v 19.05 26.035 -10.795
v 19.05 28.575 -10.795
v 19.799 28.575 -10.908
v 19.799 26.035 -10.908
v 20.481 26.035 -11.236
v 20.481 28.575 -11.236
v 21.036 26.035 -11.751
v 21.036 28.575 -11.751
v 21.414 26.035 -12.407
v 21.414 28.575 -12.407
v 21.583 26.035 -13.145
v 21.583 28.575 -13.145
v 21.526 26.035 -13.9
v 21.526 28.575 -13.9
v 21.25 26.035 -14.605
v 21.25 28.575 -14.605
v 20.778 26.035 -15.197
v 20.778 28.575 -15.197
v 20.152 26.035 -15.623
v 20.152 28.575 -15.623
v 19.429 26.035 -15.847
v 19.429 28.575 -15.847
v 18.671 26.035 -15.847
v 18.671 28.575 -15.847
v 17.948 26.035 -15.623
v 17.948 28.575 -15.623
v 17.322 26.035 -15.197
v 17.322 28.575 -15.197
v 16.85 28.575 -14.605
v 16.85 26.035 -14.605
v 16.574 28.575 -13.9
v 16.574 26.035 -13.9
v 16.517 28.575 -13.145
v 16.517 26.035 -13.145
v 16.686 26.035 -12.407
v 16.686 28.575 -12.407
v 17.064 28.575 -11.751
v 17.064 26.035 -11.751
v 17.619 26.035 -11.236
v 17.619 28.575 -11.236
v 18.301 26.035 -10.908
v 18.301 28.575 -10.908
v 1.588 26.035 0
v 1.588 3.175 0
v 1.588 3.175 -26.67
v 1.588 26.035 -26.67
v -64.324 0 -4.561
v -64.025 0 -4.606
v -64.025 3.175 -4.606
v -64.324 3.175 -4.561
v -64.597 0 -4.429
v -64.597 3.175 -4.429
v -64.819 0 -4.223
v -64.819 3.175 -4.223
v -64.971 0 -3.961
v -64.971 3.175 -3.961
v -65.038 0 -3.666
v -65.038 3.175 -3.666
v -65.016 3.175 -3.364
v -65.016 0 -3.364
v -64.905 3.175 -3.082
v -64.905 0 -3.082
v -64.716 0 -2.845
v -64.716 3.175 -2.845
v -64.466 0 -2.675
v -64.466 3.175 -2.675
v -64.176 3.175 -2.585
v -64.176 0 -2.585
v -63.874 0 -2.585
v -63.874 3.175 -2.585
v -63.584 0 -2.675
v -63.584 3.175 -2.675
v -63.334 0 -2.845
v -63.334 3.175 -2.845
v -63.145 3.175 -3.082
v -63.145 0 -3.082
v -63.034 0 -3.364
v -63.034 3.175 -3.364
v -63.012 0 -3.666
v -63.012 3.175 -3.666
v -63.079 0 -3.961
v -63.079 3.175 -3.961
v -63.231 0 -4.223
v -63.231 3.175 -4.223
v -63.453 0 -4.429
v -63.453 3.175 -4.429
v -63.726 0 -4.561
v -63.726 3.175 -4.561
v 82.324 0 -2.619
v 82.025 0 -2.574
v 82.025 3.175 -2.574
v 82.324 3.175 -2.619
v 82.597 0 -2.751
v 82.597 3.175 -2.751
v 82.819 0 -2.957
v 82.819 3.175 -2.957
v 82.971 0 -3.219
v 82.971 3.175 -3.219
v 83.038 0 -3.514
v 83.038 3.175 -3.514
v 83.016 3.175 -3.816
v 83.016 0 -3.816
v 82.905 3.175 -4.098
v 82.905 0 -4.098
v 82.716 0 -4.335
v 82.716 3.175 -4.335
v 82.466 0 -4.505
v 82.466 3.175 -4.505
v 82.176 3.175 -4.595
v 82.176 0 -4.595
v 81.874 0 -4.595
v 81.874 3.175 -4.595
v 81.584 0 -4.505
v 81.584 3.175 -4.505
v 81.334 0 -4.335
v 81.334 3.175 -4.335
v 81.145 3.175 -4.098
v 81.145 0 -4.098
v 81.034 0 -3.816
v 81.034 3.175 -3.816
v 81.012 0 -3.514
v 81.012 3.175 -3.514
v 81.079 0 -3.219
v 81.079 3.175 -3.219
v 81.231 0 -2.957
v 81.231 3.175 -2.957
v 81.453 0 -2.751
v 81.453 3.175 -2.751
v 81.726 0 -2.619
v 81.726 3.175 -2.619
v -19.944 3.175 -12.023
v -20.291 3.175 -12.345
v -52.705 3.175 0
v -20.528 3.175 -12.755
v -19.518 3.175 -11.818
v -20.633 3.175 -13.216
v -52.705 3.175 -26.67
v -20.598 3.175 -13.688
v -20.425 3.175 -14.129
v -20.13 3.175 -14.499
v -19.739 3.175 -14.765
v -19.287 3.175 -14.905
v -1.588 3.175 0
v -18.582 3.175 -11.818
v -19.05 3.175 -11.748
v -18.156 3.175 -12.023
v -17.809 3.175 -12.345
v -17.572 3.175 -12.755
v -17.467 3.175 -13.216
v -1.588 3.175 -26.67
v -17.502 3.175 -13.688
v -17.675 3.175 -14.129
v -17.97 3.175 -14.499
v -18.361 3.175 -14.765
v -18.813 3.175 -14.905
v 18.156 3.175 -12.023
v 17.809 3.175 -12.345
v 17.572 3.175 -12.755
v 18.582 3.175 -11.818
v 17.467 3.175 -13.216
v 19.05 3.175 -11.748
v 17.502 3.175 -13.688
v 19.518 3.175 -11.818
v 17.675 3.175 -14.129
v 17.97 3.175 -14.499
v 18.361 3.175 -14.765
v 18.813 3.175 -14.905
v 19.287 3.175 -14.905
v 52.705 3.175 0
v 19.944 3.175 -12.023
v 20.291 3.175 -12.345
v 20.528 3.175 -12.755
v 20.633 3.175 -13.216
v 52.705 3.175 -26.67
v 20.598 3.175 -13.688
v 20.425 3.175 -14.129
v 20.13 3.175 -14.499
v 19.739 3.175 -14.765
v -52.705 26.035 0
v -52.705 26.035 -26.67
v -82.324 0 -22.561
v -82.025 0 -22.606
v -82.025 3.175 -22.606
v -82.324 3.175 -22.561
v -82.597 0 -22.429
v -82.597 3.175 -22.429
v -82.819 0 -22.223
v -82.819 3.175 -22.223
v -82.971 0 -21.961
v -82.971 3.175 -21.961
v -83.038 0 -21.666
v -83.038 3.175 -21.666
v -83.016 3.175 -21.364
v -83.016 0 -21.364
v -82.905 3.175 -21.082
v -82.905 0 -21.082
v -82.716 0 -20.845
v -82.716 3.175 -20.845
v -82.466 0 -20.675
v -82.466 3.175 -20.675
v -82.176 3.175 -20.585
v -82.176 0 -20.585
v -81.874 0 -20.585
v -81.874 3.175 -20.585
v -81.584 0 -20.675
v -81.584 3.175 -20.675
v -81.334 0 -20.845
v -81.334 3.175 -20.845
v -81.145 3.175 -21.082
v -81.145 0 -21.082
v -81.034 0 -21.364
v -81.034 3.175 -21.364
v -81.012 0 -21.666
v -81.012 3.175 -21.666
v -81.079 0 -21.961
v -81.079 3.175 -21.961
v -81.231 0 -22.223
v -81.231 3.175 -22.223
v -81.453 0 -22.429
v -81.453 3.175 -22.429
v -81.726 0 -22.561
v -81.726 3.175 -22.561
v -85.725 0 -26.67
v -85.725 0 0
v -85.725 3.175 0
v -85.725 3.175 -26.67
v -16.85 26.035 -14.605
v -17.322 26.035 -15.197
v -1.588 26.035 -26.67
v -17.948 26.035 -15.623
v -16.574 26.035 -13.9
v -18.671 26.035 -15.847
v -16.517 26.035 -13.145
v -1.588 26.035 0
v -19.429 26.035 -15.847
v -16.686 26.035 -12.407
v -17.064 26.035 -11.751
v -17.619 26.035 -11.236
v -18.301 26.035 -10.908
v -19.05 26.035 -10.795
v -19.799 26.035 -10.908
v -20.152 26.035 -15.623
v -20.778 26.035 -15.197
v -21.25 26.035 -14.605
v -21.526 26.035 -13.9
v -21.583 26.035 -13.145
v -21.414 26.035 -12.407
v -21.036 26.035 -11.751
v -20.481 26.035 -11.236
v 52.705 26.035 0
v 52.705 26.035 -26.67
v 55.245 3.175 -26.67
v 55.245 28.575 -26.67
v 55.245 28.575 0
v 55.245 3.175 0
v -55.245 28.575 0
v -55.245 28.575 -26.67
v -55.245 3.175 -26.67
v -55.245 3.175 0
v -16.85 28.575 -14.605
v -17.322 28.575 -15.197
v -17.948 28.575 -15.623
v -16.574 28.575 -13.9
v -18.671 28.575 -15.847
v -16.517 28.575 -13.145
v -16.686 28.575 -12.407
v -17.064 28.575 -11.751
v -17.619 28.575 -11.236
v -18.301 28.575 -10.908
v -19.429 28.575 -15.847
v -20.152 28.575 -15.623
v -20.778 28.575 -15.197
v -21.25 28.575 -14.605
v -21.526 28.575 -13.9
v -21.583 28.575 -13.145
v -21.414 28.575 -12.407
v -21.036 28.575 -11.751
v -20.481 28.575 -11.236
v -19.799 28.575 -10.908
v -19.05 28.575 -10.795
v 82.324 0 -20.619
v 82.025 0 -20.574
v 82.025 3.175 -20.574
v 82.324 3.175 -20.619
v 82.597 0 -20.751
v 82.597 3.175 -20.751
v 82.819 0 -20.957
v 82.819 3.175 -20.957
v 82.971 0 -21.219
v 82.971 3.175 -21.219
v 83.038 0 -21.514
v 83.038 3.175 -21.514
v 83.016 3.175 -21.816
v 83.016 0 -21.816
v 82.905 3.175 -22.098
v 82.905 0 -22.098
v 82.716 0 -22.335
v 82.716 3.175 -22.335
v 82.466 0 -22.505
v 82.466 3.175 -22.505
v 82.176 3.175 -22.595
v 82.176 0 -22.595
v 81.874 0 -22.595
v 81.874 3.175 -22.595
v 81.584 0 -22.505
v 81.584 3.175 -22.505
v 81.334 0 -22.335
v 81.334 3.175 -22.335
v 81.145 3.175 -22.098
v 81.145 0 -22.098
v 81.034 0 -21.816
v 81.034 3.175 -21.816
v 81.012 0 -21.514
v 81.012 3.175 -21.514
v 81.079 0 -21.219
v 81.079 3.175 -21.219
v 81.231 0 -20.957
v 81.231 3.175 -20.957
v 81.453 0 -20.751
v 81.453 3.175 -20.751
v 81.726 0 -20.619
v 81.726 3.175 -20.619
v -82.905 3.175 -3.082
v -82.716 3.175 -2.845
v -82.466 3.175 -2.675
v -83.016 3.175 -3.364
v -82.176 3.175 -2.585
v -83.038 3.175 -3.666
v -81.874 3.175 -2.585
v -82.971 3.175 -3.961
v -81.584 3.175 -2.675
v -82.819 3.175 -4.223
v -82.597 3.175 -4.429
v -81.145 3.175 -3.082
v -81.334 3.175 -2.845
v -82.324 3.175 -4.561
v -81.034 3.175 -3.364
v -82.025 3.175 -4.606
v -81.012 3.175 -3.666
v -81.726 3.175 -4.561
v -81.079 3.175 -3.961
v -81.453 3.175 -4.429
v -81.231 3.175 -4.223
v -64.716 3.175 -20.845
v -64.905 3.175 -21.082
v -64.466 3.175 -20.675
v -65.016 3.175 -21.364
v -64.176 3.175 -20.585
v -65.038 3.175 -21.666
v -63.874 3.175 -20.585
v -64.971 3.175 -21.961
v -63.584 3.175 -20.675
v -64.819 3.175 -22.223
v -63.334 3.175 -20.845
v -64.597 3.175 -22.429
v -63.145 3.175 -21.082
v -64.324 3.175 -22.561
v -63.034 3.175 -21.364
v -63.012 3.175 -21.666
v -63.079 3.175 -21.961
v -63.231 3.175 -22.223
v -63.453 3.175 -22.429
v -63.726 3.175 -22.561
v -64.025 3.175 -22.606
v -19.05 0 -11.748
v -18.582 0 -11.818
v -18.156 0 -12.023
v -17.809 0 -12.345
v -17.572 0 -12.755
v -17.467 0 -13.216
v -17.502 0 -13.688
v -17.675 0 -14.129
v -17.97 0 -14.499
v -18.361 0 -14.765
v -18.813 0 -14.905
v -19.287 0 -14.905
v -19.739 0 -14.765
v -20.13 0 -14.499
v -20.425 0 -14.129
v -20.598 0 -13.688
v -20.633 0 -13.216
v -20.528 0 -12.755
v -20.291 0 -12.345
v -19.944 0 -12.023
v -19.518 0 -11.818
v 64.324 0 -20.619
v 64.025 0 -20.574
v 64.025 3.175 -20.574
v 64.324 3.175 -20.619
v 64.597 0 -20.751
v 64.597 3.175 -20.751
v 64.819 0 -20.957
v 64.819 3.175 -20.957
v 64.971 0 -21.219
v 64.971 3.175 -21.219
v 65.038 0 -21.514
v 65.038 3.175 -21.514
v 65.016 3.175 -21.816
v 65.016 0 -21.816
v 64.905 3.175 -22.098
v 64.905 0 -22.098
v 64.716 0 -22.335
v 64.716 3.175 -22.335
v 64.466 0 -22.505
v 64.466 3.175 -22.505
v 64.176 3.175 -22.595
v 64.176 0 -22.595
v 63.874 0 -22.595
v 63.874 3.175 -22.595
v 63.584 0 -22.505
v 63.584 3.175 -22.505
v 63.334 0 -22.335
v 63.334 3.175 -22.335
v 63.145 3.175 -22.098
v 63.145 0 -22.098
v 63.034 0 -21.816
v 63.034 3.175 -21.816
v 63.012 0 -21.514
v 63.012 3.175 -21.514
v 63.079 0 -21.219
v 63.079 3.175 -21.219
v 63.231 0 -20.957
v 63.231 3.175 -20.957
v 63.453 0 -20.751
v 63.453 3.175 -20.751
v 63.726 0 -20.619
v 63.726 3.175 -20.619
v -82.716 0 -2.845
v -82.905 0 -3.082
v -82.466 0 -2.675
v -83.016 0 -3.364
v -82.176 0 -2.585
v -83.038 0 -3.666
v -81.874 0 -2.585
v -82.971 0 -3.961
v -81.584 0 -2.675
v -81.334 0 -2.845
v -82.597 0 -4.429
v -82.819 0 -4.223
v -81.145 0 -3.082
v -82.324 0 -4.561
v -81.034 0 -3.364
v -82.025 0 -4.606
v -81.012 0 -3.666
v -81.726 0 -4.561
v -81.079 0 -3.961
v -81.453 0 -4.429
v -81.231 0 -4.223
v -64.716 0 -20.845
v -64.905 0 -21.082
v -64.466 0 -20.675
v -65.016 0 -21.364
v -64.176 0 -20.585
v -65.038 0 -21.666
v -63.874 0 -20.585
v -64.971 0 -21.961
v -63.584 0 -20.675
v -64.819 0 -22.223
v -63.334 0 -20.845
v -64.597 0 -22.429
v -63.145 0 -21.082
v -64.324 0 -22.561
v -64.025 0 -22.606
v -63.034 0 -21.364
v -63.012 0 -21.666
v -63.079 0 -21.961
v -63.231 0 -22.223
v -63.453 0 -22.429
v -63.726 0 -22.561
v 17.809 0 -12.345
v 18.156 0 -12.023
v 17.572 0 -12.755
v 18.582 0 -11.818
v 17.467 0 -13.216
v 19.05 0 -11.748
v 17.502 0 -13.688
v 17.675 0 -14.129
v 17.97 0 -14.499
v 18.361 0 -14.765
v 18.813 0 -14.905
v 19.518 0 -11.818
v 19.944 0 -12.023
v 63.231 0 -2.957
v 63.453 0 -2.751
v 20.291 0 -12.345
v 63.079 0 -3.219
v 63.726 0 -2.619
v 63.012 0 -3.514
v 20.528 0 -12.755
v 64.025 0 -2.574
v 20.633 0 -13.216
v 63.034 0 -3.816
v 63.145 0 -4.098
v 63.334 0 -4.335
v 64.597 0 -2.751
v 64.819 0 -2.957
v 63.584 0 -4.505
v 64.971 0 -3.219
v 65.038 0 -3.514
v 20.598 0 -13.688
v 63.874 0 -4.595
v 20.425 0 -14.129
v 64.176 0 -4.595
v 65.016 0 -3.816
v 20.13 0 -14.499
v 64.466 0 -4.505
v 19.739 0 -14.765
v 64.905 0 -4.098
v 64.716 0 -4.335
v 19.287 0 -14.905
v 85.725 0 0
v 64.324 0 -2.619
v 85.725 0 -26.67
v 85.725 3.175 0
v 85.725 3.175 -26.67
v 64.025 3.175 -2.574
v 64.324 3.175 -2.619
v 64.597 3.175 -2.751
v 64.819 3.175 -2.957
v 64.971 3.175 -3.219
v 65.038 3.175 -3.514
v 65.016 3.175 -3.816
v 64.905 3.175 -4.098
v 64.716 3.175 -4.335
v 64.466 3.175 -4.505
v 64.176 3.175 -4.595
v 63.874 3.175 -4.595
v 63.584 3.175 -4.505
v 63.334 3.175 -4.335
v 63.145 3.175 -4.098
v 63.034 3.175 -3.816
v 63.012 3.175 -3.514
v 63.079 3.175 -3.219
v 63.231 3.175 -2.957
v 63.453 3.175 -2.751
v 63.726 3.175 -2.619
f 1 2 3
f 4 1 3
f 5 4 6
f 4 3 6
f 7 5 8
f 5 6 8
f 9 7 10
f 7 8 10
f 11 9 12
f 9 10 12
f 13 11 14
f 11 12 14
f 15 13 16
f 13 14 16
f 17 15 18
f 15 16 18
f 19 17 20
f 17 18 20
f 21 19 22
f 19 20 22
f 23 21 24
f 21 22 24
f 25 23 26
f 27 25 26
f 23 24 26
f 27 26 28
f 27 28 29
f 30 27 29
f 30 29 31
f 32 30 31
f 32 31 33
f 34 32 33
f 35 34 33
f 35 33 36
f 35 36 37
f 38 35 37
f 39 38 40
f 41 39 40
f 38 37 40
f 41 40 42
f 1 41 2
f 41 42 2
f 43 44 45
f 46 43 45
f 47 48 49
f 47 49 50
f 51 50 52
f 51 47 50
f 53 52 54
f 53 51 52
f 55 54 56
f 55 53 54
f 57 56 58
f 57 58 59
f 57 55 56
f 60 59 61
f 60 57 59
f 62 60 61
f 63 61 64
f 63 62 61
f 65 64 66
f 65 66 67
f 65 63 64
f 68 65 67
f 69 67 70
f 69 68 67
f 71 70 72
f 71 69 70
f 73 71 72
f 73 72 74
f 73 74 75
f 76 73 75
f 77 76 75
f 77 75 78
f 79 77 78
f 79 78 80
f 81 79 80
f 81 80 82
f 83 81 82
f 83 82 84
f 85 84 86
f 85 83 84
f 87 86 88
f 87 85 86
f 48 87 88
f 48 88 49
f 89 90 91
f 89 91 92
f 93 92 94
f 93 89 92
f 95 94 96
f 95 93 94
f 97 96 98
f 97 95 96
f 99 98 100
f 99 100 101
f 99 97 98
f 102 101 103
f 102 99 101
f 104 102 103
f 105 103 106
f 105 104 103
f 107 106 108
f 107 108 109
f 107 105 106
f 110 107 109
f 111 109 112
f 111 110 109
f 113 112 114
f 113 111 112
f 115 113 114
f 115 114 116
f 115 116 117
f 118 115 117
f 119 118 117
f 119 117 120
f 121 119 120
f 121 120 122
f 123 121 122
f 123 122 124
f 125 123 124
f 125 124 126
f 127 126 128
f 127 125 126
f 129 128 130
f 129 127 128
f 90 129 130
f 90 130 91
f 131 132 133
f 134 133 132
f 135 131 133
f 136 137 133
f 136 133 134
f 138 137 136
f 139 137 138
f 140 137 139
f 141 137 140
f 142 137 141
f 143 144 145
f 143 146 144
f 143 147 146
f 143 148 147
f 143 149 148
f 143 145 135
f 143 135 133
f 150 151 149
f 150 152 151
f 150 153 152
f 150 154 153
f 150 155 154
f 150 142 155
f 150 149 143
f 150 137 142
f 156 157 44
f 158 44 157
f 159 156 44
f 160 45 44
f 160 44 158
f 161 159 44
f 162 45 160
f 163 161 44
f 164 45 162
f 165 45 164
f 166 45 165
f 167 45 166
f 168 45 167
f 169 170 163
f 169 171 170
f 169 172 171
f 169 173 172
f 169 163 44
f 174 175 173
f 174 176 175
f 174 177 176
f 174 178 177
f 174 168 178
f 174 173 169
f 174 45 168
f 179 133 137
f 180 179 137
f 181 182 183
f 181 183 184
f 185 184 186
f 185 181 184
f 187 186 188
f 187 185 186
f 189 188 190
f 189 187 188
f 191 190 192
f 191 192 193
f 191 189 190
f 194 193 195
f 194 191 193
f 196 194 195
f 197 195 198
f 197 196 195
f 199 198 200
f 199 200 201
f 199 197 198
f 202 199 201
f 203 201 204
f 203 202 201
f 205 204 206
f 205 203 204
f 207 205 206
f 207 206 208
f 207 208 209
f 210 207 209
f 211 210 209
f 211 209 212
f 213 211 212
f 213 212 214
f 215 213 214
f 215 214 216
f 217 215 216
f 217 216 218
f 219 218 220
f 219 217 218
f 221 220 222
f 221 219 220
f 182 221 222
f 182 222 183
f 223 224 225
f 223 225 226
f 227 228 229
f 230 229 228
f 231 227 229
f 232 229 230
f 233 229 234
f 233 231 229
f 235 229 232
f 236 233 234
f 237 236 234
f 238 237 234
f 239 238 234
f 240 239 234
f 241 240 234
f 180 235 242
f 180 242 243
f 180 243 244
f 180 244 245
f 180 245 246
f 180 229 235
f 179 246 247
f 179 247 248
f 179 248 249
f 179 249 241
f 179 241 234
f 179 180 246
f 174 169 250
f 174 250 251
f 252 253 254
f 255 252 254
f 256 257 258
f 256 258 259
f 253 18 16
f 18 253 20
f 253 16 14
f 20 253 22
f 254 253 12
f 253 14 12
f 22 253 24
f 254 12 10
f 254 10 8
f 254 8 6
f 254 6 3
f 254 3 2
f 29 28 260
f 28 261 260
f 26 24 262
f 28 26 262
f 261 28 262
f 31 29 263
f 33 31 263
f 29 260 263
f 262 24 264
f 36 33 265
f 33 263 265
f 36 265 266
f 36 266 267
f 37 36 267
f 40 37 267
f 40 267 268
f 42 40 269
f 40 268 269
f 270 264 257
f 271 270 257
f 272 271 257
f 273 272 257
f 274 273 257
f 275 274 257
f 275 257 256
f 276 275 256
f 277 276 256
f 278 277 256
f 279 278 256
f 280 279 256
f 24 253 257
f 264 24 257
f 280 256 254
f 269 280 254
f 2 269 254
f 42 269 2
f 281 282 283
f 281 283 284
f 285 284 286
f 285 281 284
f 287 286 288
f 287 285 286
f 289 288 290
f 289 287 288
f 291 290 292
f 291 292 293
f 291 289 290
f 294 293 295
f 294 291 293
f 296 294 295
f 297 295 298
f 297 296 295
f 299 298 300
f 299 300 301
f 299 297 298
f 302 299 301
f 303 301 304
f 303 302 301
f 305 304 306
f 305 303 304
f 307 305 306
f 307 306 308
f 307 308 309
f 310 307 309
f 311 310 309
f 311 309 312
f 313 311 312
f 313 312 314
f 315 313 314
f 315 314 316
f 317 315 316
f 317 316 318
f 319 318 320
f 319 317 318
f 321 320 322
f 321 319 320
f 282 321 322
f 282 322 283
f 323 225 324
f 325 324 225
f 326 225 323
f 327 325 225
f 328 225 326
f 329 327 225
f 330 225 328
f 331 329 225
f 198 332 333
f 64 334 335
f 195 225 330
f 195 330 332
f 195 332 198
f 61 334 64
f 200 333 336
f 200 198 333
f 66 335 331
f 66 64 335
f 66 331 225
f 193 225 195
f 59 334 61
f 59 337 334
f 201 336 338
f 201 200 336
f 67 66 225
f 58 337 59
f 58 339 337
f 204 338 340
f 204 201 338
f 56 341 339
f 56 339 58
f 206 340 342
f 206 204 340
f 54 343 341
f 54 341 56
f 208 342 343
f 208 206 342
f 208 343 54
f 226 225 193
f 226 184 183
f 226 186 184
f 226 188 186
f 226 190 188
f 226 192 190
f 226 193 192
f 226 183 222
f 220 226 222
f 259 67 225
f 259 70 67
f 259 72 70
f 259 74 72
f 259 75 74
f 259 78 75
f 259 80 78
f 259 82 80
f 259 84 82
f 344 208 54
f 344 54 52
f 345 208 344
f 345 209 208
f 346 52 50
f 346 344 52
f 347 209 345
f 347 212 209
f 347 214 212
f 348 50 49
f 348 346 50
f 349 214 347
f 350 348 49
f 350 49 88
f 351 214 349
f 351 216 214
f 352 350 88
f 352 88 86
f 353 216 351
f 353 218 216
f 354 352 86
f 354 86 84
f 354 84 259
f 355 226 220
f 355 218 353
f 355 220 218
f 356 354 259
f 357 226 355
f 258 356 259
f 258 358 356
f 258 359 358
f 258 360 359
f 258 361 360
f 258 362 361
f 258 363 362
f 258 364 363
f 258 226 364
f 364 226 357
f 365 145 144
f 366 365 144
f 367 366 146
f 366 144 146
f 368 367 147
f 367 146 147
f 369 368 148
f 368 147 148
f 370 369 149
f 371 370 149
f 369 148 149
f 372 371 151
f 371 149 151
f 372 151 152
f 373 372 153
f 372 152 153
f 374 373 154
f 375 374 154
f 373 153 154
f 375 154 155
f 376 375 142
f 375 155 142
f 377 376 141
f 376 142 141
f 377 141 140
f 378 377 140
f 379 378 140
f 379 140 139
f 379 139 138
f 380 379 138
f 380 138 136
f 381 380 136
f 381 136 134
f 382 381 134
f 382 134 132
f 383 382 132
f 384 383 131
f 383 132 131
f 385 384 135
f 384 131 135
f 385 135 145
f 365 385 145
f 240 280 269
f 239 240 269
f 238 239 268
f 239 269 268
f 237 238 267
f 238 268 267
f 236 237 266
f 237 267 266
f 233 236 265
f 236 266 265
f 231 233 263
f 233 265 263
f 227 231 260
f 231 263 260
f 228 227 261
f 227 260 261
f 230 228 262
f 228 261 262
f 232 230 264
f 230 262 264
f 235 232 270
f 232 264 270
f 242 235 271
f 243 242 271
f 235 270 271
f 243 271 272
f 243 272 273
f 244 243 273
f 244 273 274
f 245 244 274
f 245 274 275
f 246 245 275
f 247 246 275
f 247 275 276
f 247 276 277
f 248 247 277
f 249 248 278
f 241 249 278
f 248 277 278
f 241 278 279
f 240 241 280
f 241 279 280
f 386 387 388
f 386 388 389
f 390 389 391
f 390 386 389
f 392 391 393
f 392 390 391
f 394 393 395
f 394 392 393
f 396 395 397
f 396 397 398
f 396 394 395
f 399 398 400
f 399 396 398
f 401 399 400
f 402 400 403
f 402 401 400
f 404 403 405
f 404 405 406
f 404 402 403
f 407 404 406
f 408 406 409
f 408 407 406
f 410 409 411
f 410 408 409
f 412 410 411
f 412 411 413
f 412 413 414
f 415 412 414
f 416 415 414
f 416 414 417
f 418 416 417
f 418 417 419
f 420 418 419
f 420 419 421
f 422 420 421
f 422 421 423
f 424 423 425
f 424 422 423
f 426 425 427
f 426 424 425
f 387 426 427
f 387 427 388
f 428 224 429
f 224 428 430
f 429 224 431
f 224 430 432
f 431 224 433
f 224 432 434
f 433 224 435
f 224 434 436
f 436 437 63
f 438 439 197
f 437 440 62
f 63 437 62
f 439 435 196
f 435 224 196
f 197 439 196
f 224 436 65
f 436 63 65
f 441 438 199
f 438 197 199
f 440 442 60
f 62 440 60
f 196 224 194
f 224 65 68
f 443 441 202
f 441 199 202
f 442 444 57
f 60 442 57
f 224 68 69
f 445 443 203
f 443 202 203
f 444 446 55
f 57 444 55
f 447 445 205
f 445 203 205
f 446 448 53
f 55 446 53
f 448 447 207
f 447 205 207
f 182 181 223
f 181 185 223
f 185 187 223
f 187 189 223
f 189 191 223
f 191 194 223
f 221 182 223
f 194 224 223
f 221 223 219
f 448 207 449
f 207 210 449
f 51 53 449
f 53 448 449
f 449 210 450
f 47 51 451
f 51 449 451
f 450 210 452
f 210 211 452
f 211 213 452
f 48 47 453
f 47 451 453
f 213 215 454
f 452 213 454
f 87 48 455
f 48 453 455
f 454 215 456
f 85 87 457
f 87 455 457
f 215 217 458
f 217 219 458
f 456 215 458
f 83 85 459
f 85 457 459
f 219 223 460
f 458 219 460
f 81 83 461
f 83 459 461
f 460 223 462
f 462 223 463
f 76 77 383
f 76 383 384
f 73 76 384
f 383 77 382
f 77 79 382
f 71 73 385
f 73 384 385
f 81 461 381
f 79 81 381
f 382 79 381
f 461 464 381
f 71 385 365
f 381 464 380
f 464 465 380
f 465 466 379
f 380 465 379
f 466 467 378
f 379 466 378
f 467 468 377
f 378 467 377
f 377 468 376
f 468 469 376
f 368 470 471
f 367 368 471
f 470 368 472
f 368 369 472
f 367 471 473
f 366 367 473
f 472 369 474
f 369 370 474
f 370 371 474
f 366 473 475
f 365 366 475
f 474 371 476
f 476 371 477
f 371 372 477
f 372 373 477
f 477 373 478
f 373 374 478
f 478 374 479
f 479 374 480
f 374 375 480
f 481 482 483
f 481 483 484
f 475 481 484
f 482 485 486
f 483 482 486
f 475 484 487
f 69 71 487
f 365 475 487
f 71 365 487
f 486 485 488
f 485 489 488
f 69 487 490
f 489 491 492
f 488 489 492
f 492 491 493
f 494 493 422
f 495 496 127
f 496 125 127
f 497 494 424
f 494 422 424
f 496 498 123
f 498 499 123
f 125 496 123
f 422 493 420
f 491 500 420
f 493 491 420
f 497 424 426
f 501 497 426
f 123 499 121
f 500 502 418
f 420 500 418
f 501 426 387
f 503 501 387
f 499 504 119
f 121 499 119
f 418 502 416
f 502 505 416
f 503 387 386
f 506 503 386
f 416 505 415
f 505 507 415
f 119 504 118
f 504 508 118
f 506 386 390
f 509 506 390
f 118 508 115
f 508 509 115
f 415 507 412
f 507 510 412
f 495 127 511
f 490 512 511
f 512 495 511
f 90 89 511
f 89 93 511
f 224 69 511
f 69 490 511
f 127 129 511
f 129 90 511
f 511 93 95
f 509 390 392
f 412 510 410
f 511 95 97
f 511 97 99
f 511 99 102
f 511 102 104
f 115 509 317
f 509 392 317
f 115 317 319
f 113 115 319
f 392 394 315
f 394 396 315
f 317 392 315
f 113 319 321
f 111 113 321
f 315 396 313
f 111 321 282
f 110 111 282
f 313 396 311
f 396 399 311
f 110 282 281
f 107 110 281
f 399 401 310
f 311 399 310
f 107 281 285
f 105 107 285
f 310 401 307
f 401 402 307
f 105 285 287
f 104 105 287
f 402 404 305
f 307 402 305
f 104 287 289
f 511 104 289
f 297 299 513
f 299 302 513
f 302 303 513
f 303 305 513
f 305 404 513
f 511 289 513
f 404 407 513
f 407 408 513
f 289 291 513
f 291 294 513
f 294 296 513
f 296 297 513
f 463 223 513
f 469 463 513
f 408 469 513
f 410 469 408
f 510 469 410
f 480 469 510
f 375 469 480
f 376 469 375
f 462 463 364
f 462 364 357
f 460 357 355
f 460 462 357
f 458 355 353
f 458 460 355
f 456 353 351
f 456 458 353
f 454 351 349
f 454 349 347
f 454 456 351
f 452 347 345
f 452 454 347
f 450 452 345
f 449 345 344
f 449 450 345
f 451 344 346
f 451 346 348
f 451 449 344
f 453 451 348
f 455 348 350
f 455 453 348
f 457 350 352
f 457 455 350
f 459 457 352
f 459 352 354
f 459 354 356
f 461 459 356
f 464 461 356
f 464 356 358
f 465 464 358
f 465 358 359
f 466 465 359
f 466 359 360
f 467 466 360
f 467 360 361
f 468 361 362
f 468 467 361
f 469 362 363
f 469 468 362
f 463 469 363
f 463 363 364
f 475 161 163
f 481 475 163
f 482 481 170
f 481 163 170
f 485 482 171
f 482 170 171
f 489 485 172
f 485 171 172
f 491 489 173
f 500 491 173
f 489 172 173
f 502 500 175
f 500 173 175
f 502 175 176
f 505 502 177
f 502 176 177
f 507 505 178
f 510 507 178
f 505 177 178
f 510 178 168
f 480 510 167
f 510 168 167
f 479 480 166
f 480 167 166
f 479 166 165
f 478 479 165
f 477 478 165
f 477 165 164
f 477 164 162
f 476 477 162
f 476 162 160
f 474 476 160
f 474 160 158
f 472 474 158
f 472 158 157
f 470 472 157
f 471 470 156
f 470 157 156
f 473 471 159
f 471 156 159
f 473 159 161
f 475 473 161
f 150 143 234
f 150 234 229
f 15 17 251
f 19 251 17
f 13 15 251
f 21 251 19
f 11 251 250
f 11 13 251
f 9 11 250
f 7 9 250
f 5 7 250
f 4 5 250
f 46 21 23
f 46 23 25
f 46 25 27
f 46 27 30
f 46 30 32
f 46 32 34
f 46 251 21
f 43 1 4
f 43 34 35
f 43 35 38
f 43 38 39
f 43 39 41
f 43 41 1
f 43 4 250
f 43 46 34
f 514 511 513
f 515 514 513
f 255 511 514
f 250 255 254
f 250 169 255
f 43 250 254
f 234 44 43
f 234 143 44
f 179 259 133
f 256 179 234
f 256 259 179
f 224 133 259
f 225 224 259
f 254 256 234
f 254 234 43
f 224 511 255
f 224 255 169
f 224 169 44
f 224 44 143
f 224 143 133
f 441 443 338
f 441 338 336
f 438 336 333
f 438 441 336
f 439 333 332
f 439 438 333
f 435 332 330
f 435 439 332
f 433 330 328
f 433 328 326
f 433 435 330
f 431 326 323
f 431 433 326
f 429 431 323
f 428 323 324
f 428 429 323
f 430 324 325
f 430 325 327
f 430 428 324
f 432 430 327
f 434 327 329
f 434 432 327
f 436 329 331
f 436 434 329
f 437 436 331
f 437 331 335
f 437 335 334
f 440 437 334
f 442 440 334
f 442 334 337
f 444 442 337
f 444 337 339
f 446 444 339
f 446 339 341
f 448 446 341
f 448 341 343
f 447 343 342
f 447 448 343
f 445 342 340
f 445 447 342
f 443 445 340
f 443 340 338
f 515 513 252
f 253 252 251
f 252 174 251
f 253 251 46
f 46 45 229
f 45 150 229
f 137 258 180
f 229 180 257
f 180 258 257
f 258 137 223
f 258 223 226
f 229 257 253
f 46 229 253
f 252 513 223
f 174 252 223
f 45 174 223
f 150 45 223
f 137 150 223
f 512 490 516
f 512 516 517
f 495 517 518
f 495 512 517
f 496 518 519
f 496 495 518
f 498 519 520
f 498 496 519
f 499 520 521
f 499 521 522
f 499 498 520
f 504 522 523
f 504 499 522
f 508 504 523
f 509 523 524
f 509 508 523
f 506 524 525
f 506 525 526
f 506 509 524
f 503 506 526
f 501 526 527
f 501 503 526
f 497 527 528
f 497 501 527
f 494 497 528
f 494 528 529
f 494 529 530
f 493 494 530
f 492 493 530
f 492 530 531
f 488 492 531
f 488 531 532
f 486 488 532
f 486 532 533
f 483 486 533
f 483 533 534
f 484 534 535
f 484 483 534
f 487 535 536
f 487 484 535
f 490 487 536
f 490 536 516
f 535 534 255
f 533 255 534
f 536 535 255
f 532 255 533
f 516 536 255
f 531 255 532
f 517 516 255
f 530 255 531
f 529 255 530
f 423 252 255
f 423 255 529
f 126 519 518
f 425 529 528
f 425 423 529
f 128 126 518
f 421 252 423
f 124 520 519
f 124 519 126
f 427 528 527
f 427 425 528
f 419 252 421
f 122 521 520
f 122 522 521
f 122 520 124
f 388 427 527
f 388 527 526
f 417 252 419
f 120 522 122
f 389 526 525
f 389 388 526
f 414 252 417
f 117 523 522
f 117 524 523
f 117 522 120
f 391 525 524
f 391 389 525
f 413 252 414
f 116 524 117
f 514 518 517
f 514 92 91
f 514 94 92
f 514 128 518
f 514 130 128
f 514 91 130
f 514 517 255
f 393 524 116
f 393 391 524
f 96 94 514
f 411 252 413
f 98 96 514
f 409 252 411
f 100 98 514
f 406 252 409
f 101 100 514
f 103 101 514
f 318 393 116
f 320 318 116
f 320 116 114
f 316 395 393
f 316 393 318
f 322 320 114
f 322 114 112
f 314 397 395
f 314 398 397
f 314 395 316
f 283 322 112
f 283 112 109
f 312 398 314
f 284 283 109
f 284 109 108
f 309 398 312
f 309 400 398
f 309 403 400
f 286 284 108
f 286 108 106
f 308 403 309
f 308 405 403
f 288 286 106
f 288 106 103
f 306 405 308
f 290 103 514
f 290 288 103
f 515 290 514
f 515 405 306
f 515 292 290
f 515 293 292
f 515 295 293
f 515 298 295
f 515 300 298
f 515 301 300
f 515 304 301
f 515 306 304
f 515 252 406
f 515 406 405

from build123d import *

# Parameters (mm, degrees)
SKETCH1_W           = 171.45
SKETCH1_H           = 26.67
SKETCH1_R           = 1.016
BOSS_EXTRUDE1_DEPTH = 3.175
SKETCH2_W           = 2.54
SKETCH2_H           = 26.67
BOSS_EXTRUDE2_DEPTH = 22.86
SKETCH3_W           = 26.67
SKETCH3_H           = 2.54
BOSS_EXTRUDE3_DEPTH = 110.49
SKETCH4_R           = 1.5875
CUT_EXTRUDE1_DEPTH  = 3.175
SKETCH5_R           = 2.54
CUT_EXTRUDE2_DEPTH  = 2.54
SKETCH6_W           = 3.175
SKETCH6_H           = 26.67
BOSS_EXTRUDE4_DEPTH = 22.86


with BuildPart() as part:
    # Sketch1 → Boss-Extrude1 (new body)
    with BuildSketch(Plane(origin=(0, 0, 0), x_dir=(1, 0, 0), z_dir=(0, 1, 0))):
        with Locations((0, 13.335)):
            Rectangle(SKETCH1_W, SKETCH1_H)
        with Locations(Location((64.025, 21.59, 0), (0, 0, 270))):
            Circle(SKETCH1_R, mode=Mode.SUBTRACT)
        with Locations(Location((82.025, 21.59, 0), (0, 0, 270))):
            Circle(SKETCH1_R, mode=Mode.SUBTRACT)
        with Locations(Location((64.025, 3.59, 0), (0, 0, 270))):
            Circle(SKETCH1_R, mode=Mode.SUBTRACT)
        with Locations(Location((82.025, 3.59, 0), (0, 0, 270))):
            Circle(SKETCH1_R, mode=Mode.SUBTRACT)
        with Locations(Location((-82.025, 3.59, 0), (0, 0, 90))):
            Circle(SKETCH1_R, mode=Mode.SUBTRACT)
        with Locations(Location((-64.025, 3.59, 0), (0, 0, 90))):
            Circle(SKETCH1_R, mode=Mode.SUBTRACT)
        with Locations(Location((-82.025, 21.59, 0), (0, 0, 90))):
            Circle(SKETCH1_R, mode=Mode.SUBTRACT)
        with Locations(Location((-64.025, 21.59, 0), (0, 0, 90))):
            Circle(SKETCH1_R, mode=Mode.SUBTRACT)
    extrude(amount=BOSS_EXTRUDE1_DEPTH)

    # Sketch2 → Boss-Extrude2 (add)
    with BuildSketch(Plane(origin=(0, 3.175, 0), x_dir=(1, 0, 0), z_dir=(0, 1, 0))):
        with Locations((-53.975, 13.335)):
            Rectangle(SKETCH2_W, SKETCH2_H)
    boss_extrude2 = extrude(amount=BOSS_EXTRUDE2_DEPTH)

    # Mirror1: Boss-Extrude2 across plane
    add(boss_extrude2.mirror(Plane(origin=(0, 0, 0), x_dir=(0, 0, 1), z_dir=(1, 0, 0))))

    # Sketch3 → Boss-Extrude3 (add)
    with BuildSketch(Plane.ZY.offset(55.245)):
        with Locations((-13.335, 27.305)):
            Rectangle(SKETCH3_W, SKETCH3_H)
    extrude(amount=-BOSS_EXTRUDE3_DEPTH)

    # Sketch4 → Cut-Extrude1 (cut)
    with BuildSketch(Plane(origin=(0, 3.175, 0), x_dir=(1, 0, 0), z_dir=(0, 1, 0))):
        with Locations(Location((-19.05, 13.335, 0), (0, 0, 270))):
            Circle(SKETCH4_R)
        with Locations(Location((19.05, 13.335, 0), (0, 0, 270))):
            Circle(SKETCH4_R)
    extrude(amount=-CUT_EXTRUDE1_DEPTH, mode=Mode.SUBTRACT)

    # Sketch5 → Cut-Extrude2 (cut)
    with BuildSketch(Plane(origin=(0, 28.575, 0), x_dir=(1, 0, 0), z_dir=(0, 1, 0))):
        with Locations(Location((-19.05, 13.335, 0), (0, 0, 270))):
            Circle(SKETCH5_R)
        with Locations(Location((19.05, 13.335, 0), (0, 0, 270))):
            Circle(SKETCH5_R)
    extrude(amount=-CUT_EXTRUDE2_DEPTH, mode=Mode.SUBTRACT)

    # Sketch6 → Boss-Extrude4 (add)
    with BuildSketch(Plane(origin=(0, 3.175, 0), x_dir=(1, 0, 0), z_dir=(0, 1, 0))):
        with Locations((0, 13.335)):
            Rectangle(SKETCH6_W, SKETCH6_H)
    extrude(amount=BOSS_EXTRUDE4_DEPTH)


solid = part.part
